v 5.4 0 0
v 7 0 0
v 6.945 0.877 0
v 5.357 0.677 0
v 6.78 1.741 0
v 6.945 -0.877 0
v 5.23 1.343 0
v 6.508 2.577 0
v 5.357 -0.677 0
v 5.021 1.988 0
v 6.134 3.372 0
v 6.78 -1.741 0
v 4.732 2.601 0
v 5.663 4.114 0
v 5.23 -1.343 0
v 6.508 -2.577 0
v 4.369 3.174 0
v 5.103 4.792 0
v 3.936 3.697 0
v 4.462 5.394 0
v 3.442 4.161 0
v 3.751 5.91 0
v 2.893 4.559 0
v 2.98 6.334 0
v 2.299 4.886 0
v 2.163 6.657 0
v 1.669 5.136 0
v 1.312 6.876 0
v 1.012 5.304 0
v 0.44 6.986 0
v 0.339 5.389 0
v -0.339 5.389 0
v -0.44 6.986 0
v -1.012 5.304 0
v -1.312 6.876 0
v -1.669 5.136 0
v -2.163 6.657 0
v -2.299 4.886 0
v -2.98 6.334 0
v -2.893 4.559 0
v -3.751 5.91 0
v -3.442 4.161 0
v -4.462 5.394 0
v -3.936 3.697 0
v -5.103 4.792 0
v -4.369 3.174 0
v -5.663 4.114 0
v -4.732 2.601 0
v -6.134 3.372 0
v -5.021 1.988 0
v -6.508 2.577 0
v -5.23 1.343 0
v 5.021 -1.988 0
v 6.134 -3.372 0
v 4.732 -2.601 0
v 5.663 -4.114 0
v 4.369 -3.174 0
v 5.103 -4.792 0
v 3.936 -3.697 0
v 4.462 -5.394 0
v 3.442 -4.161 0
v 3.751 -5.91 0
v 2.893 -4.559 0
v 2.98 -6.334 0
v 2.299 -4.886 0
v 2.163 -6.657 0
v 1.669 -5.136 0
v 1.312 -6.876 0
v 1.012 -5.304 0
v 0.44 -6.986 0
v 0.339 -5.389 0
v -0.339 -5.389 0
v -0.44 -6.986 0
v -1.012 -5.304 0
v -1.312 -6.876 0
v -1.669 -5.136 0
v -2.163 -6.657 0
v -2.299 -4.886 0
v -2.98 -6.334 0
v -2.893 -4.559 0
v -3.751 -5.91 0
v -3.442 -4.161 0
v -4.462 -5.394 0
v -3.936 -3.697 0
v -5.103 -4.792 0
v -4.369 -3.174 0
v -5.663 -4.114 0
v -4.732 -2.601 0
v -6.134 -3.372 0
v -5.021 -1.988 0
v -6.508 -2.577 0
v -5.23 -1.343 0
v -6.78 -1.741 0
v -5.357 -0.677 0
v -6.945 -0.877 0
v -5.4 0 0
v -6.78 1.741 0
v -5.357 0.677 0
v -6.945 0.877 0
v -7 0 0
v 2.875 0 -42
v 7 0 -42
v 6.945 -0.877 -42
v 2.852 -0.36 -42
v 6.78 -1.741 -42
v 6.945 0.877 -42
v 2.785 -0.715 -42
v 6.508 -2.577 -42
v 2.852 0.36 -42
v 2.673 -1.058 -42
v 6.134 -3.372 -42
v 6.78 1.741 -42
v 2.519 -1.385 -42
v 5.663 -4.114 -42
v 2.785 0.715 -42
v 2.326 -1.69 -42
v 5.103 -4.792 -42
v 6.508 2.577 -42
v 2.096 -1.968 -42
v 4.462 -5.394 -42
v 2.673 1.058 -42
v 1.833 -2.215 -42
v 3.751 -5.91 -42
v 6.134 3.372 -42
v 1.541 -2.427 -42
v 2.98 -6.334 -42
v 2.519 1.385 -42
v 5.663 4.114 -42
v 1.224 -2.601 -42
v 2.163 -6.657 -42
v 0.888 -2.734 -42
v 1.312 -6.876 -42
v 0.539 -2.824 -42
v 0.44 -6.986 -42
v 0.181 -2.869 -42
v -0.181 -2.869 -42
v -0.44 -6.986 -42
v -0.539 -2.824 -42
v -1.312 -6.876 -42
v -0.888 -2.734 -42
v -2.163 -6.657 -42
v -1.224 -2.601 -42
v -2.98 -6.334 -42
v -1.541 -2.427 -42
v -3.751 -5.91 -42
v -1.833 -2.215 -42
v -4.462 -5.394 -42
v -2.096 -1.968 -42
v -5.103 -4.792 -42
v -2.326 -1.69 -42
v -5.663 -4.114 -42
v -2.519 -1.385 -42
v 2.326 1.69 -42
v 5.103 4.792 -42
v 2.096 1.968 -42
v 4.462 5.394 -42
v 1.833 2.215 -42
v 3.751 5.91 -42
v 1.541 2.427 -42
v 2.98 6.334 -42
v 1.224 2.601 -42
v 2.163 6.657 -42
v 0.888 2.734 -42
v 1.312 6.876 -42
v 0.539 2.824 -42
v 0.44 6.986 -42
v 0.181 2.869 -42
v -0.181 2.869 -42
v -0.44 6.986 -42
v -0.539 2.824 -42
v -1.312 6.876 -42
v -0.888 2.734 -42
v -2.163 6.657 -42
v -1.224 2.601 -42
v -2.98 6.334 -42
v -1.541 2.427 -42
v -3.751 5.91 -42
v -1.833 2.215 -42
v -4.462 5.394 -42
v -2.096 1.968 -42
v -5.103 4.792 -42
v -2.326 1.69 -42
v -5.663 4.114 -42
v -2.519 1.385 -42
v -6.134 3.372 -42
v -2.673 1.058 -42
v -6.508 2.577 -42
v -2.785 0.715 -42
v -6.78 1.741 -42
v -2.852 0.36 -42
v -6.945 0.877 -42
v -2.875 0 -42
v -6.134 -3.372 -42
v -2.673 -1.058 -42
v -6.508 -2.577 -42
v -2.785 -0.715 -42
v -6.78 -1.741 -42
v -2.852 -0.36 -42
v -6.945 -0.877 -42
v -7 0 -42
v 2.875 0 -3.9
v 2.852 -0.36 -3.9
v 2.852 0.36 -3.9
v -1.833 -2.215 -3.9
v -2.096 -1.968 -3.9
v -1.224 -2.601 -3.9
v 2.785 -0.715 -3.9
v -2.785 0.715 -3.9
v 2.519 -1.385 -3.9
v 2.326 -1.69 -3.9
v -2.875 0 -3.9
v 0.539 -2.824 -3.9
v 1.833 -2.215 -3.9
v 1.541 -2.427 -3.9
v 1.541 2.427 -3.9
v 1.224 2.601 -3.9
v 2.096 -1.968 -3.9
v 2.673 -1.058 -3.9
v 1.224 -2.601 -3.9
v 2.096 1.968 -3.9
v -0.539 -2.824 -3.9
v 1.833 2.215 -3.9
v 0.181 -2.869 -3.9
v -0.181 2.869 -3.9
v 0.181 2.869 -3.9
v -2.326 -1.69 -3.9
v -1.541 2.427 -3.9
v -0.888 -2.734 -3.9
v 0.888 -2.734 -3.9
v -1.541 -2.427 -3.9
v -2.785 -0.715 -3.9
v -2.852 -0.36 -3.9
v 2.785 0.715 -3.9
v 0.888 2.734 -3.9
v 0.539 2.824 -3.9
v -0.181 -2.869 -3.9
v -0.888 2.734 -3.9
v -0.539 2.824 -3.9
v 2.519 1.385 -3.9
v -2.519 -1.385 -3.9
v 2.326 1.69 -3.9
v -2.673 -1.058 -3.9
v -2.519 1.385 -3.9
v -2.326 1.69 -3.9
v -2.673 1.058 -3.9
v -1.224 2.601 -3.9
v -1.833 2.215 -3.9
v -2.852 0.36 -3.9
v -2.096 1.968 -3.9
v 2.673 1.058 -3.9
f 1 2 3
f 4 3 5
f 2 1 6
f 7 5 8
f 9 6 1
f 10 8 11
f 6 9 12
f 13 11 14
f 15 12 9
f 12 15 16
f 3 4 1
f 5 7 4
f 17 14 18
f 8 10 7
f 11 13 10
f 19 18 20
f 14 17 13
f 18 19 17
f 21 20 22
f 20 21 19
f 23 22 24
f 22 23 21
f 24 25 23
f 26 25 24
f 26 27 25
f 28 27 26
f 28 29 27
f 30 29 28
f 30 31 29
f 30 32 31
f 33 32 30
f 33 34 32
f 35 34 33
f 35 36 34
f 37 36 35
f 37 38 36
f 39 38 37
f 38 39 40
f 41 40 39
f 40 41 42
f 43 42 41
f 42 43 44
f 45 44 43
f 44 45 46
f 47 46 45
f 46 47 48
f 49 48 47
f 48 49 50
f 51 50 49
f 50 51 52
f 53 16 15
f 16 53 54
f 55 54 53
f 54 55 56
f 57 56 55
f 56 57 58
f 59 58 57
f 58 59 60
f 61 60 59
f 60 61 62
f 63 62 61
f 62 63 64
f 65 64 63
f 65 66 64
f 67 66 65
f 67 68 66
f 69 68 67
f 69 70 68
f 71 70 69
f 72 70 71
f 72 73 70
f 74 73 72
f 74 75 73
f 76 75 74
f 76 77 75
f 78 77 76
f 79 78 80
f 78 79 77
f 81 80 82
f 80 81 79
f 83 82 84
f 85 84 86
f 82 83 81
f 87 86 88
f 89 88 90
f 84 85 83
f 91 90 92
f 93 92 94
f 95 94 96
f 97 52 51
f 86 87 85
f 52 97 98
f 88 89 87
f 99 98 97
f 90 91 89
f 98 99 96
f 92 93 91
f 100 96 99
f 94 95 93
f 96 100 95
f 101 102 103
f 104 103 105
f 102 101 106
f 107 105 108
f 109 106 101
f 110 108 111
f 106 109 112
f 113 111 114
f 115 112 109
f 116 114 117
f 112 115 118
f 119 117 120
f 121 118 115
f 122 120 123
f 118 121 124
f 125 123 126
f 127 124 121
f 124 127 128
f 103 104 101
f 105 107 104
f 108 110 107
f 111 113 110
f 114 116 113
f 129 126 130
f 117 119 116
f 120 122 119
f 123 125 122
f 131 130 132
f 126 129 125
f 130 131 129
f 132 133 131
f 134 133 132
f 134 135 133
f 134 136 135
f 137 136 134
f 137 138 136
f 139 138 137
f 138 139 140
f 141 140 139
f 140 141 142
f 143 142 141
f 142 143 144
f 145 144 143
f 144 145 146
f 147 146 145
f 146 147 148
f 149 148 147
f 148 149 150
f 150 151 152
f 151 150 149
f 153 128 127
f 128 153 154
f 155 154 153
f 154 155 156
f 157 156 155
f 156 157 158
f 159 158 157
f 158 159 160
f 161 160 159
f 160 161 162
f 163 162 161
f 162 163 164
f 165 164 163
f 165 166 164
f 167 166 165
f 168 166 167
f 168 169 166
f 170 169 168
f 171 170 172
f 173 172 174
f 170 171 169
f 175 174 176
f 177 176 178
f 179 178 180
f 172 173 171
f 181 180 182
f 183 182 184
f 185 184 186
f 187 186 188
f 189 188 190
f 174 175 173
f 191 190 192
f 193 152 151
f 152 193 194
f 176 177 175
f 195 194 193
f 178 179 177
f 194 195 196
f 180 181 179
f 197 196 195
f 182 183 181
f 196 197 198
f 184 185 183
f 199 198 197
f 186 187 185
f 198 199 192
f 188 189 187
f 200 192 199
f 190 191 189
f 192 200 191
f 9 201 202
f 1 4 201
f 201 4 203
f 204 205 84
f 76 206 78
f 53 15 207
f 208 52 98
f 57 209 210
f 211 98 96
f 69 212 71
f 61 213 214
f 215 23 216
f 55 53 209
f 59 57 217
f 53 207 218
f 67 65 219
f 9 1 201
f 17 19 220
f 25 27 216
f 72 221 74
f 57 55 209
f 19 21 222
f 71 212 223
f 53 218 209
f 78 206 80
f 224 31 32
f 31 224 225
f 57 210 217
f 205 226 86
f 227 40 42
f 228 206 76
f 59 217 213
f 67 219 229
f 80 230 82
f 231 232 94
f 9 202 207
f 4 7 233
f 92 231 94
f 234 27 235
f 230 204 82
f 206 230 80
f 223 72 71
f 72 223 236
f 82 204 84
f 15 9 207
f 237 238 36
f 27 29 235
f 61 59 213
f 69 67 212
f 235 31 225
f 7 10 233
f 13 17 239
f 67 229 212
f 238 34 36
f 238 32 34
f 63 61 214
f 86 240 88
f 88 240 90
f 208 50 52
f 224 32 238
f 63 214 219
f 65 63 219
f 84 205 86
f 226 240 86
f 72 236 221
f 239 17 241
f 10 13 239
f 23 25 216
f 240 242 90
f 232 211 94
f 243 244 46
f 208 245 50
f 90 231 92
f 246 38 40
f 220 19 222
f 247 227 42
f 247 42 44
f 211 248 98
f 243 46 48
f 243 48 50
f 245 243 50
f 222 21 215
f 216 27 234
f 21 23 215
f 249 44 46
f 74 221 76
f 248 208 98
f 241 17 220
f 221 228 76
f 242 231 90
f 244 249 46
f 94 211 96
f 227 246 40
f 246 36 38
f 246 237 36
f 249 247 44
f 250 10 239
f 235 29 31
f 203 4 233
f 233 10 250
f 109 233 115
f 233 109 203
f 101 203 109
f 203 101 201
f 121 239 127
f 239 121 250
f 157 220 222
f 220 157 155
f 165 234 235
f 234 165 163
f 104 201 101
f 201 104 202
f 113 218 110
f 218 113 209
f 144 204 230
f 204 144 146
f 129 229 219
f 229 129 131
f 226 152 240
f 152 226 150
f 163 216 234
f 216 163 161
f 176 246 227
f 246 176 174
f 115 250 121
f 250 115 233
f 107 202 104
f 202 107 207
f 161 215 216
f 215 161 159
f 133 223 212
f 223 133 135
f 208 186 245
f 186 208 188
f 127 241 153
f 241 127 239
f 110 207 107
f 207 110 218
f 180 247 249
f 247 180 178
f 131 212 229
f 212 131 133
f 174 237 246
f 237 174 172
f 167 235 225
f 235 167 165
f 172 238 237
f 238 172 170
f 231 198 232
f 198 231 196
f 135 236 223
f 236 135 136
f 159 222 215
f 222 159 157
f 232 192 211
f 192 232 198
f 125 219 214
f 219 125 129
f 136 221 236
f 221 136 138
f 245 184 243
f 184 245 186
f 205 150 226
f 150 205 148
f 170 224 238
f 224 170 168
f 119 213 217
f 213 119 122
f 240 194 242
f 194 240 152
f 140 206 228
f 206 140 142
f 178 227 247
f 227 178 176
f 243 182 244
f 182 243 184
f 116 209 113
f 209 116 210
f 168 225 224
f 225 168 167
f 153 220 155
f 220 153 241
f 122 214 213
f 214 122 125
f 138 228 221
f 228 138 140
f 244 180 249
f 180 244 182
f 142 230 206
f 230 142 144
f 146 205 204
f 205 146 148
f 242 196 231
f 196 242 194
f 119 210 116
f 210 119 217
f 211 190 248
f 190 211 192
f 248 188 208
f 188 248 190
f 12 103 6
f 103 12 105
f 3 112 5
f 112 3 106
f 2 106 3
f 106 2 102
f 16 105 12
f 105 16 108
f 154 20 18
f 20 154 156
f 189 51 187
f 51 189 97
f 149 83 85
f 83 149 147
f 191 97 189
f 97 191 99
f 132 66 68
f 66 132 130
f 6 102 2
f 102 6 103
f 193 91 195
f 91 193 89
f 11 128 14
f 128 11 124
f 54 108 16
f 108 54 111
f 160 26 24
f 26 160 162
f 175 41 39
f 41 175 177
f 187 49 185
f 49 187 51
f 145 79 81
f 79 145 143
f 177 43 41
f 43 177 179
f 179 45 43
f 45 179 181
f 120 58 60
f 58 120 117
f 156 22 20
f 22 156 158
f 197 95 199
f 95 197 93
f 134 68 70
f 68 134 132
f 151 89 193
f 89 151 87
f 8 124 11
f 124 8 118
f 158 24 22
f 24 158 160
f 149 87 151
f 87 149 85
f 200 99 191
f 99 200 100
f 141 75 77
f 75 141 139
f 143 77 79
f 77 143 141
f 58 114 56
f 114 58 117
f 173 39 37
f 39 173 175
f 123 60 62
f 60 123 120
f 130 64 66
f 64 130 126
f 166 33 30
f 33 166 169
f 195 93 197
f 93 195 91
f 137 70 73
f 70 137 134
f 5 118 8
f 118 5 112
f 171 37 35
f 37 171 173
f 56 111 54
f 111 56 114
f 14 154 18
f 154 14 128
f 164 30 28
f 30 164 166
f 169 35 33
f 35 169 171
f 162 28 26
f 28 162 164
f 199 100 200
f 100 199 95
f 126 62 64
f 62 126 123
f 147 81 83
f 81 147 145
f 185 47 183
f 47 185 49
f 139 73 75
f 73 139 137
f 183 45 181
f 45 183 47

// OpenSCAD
$fn = 50;


difference() {
	union() {
		translate(v = [0, 0, -42.0000000000]) {
			cylinder(h = 42, r = 7.0000000000);
		}
		cylinder(h = 0, r = 17.0000000000);
	}
	union() {
		translate(v = [0, 0, 0]) {
			rotate(a = [0, 0, 0]) {
				difference() {
					union() {
						#translate(v = [0, 0, -42.0000000000]) {
							cylinder(h = 42, r = 2.6000000000);
						}
						#translate(v = [0, 0, -3.9000000000]) {
							cylinder(h = 3.9000000000, r = 7.0000000000, r1 = 2.8750000000, r2 = 5.4000000000);
						}
						#translate(v = [0, 0, -42.0000000000]) {
							cylinder(h = 42, r = 2.8750000000);
						}
						#translate(v = [0, 0, -42.0000000000]) {
							cylinder(h = 42, r = 2.6000000000);
						}
					}
					union();
				}
			}
		}
	}
}
